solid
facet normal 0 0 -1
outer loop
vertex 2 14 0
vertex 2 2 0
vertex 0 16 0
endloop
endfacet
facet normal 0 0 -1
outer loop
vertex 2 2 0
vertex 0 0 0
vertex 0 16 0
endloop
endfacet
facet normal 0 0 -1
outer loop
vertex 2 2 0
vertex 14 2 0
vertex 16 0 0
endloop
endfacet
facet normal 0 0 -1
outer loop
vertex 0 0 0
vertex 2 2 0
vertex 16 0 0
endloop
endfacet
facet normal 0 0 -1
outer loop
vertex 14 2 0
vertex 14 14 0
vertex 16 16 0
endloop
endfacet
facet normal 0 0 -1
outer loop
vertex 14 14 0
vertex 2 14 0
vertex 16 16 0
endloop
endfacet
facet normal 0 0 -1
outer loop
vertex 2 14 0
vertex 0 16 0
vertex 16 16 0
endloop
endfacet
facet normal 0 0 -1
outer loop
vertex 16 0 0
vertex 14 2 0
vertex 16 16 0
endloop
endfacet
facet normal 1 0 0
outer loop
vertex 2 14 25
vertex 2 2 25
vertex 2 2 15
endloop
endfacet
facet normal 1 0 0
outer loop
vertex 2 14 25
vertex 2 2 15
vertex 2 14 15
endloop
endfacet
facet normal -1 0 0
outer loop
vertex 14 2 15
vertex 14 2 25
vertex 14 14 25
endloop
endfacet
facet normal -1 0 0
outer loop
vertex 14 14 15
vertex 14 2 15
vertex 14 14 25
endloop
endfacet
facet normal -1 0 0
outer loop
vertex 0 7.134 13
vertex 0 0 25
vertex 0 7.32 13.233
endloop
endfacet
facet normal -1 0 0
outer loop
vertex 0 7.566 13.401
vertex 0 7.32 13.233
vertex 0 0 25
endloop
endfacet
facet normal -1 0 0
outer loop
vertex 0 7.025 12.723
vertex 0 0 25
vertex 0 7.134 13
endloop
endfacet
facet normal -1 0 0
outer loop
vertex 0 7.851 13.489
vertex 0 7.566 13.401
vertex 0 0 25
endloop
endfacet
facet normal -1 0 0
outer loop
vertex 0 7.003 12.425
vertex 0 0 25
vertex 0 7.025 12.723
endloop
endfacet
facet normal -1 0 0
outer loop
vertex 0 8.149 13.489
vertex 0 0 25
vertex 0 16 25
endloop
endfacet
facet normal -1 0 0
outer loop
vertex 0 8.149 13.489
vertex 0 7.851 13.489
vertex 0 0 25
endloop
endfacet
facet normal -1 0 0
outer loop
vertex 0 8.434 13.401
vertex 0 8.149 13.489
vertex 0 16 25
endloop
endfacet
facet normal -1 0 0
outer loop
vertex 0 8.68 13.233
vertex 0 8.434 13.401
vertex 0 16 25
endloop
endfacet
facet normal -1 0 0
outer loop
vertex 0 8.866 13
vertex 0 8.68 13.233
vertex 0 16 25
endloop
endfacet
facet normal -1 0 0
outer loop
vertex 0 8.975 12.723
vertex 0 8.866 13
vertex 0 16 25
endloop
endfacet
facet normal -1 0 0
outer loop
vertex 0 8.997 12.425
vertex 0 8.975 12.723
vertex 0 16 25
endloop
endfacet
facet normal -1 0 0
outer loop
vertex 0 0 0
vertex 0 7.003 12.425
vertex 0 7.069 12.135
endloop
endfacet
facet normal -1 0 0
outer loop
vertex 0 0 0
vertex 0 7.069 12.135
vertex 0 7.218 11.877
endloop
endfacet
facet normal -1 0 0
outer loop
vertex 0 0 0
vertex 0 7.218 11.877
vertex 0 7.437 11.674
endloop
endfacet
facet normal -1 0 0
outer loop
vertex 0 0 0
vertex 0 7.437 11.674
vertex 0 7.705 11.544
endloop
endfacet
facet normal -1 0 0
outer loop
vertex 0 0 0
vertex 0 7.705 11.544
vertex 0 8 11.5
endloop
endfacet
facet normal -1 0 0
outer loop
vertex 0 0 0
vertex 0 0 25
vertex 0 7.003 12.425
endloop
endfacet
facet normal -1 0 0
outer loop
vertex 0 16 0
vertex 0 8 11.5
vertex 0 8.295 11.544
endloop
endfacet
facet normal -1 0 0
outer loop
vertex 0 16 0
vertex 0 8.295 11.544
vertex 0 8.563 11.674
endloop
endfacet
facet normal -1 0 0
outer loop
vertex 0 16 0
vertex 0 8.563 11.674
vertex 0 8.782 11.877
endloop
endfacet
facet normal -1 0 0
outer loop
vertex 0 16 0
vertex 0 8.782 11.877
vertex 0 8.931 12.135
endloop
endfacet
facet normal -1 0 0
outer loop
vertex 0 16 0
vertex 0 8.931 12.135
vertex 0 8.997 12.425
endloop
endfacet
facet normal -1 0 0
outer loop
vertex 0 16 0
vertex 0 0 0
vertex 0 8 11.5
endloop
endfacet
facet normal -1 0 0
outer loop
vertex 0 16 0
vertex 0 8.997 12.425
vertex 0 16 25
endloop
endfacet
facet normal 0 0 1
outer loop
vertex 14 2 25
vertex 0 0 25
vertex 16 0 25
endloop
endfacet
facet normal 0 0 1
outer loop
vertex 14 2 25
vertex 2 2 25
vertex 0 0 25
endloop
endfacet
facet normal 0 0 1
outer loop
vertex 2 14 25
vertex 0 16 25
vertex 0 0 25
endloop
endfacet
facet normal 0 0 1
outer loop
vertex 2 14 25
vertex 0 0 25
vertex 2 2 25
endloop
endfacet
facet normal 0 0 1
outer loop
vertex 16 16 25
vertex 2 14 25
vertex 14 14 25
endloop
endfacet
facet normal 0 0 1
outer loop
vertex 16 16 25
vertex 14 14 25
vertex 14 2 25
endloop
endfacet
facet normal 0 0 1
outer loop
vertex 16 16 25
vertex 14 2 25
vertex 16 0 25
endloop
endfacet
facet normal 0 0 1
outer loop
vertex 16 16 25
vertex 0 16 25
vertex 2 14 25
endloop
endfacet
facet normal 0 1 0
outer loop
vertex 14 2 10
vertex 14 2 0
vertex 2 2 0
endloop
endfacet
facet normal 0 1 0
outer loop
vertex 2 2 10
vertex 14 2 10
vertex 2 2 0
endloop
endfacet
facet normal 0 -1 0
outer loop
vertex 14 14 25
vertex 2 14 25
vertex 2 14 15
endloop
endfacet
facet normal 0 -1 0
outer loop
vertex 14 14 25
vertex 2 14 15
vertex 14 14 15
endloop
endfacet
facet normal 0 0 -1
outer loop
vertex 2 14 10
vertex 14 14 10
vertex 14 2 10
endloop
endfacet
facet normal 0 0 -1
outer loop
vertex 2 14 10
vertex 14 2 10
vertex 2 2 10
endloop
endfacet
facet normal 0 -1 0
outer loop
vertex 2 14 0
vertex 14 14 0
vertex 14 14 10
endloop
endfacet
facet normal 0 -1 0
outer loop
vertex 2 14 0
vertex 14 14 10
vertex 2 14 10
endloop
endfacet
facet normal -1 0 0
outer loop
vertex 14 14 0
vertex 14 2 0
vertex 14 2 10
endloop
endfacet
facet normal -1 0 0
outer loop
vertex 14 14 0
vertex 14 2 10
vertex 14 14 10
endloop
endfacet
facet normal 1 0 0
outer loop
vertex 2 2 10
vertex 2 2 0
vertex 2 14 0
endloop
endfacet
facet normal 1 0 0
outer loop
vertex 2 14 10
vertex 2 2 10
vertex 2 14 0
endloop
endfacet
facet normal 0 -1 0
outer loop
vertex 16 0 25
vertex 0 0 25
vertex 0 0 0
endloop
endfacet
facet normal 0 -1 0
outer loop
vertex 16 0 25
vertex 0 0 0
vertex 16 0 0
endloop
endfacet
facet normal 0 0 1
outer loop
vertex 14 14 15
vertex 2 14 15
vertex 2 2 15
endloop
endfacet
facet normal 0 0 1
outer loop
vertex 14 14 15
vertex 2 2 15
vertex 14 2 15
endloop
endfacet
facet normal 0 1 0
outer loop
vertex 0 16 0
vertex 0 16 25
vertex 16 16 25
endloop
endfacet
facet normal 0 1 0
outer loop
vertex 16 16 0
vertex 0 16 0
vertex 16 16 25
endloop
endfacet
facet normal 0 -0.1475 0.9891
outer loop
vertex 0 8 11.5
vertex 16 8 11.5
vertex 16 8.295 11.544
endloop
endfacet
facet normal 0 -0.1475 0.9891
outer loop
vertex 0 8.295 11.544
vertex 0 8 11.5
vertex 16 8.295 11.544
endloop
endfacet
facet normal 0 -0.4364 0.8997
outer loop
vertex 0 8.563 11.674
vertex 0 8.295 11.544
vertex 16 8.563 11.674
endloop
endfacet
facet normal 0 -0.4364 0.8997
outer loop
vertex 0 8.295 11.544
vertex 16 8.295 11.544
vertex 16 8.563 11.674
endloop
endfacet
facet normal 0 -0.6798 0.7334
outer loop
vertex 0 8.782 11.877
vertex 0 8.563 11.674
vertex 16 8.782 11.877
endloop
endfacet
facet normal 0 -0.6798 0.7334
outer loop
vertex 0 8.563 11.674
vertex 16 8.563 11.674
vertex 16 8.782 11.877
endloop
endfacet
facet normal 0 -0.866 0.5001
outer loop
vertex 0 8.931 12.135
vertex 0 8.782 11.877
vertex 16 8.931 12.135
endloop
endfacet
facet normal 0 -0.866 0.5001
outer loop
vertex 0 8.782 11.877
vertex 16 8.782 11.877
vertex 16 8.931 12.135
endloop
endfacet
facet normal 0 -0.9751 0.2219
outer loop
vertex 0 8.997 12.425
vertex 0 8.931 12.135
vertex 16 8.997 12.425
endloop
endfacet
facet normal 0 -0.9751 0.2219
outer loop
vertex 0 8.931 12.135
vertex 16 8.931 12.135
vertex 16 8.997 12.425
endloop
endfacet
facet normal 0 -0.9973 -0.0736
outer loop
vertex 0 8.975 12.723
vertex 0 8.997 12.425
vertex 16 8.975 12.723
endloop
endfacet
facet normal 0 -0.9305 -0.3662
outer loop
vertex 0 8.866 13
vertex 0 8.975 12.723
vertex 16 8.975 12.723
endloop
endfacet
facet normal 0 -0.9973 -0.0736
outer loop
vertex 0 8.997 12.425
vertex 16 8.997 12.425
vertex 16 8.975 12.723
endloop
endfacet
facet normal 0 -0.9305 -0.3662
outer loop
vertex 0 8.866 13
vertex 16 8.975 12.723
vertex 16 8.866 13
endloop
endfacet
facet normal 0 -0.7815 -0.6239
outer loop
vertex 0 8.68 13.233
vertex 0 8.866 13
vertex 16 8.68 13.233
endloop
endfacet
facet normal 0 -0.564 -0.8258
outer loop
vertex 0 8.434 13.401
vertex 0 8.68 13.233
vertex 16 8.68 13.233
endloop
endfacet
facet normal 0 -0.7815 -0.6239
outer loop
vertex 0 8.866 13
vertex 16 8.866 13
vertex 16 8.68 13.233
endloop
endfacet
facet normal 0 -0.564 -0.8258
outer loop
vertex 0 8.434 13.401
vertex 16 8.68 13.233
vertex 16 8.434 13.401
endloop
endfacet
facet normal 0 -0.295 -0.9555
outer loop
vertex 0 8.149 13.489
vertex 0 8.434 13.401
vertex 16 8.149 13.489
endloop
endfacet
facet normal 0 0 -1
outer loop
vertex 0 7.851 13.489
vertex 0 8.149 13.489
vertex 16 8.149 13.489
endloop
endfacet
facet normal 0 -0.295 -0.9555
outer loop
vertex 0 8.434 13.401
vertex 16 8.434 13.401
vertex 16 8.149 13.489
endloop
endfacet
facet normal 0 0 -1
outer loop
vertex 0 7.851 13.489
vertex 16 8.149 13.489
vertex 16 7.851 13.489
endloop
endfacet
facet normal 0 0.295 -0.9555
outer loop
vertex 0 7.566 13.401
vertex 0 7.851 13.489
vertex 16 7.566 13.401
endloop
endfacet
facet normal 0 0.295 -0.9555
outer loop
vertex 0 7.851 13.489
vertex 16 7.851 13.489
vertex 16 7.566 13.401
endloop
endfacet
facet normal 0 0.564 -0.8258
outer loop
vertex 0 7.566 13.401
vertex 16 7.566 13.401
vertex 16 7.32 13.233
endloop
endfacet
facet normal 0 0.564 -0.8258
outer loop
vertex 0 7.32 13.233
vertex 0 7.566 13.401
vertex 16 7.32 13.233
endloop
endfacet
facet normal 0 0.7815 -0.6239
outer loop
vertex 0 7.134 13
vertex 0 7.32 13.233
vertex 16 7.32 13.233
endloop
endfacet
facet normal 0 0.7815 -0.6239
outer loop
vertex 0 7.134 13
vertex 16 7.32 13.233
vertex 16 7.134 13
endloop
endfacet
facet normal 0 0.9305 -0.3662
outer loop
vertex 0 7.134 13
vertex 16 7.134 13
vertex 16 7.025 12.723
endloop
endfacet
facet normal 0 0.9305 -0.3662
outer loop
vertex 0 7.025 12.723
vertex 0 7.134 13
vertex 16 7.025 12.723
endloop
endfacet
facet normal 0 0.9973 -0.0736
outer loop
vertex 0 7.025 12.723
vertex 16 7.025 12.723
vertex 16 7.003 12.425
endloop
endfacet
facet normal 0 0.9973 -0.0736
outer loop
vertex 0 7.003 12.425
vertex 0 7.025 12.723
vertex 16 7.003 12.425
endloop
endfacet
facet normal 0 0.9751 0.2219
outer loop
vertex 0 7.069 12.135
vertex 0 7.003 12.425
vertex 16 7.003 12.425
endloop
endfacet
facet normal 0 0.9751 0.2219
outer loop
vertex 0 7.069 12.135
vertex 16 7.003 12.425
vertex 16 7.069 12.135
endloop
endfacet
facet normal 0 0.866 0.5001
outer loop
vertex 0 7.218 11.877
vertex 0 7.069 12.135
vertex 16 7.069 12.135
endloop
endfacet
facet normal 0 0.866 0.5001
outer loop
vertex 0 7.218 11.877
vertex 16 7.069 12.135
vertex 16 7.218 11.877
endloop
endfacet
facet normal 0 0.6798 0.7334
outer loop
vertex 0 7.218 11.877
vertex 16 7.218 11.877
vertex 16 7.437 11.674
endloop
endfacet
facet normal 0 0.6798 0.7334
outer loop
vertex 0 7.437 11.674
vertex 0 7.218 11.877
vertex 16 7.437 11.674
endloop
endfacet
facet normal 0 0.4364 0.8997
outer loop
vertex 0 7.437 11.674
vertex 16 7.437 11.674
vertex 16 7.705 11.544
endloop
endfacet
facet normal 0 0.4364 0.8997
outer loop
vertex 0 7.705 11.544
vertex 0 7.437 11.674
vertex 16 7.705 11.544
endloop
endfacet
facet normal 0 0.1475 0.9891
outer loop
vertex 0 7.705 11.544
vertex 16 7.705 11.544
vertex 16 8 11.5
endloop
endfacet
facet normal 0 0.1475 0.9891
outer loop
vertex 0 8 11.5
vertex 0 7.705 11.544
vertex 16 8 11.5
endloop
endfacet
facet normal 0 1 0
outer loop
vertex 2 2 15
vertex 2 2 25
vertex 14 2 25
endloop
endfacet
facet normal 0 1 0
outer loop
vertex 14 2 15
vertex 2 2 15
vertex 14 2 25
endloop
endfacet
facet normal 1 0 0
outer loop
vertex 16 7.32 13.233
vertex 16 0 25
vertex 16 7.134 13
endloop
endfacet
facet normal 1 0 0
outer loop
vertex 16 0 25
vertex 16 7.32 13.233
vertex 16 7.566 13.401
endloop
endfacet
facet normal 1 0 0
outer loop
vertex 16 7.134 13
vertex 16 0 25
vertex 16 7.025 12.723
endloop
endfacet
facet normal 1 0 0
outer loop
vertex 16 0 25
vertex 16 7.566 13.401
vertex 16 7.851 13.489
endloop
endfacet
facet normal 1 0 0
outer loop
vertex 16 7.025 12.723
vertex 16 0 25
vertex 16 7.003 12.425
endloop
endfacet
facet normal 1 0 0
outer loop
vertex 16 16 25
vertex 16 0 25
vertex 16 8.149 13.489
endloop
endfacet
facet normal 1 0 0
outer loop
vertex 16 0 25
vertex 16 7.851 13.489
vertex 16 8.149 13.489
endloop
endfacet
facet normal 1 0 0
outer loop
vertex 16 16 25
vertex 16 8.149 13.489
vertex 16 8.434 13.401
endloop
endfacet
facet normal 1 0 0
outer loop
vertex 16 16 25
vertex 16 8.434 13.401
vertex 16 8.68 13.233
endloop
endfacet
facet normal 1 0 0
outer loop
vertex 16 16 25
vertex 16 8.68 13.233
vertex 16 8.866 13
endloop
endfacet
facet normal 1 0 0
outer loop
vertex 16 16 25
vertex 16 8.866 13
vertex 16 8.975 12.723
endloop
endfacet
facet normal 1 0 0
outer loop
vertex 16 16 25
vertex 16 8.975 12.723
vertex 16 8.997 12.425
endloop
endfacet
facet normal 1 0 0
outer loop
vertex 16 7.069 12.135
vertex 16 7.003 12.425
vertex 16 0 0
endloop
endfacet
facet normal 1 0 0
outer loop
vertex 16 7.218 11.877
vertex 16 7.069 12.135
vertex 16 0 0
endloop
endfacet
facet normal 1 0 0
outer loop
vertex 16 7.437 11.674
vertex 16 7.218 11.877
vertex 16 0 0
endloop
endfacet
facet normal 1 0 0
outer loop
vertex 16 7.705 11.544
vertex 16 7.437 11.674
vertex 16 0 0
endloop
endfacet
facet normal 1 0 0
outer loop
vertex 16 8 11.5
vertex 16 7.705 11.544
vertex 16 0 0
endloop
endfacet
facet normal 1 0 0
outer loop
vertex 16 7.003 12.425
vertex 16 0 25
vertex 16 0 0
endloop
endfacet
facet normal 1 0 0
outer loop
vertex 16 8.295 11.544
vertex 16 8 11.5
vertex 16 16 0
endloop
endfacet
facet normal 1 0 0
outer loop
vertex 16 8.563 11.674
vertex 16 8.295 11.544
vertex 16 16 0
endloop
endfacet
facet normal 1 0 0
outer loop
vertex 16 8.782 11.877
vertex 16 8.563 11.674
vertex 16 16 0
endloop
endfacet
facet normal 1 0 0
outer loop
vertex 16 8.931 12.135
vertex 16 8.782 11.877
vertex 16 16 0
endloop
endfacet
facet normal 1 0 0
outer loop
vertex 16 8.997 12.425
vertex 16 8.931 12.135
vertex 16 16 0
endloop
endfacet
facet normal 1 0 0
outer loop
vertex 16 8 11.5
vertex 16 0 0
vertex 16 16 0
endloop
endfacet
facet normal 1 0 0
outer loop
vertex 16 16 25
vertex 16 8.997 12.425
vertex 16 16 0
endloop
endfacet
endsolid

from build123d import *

# Parameters (mm, degrees)
SKETCH_1_W          = 16
SKETCH_1_H          = 16
EXTRUDE_2_DEPTH     = 25
SKETCH_2_W          = 12
SKETCH_2_H          = 12
CUT_EXTRUDE_1_DEPTH = 10
SKETCH_4_W          = 12
SKETCH_4_H          = 12
CUT_EXTRUDE_3_DEPTH = 10
SKETCH_5_R          = 1
CUT_EXTRUDE_4_DEPTH = 18


with BuildPart() as part:
    # 草图1 → 凸台-拉伸2 (new body)
    with BuildSketch(Plane.XY):
        with Locations((8, 8)):
            Rectangle(SKETCH_1_W, SKETCH_1_H)
    extrude(amount=EXTRUDE_2_DEPTH)

    # 草图2 → 切除-拉伸1 (cut)
    with BuildSketch(Plane(origin=(0, 0, 0), x_dir=(-1, 0, 0), z_dir=(0, 0, -1))):
        with Locations((-8, 8)):
            Rectangle(SKETCH_2_W, SKETCH_2_H)
    extrude(amount=-CUT_EXTRUDE_1_DEPTH, mode=Mode.SUBTRACT)

    # 草图4 → 切除-拉伸3 (cut)
    with BuildSketch(Plane.XY.offset(25)):
        with Locations((8, 8)):
            Rectangle(SKETCH_4_W, SKETCH_4_H)
    extrude(amount=-CUT_EXTRUDE_3_DEPTH, mode=Mode.SUBTRACT)

    # 草图5 → 切除-拉伸4 (cut)
    with BuildSketch(Plane(origin=(16, 0, 0), x_dir=(0, 0, -1), z_dir=(1, 0, 0))):
        with Locations((-12.5, 8)):
            Circle(SKETCH_5_R)
    extrude(amount=-CUT_EXTRUDE_4_DEPTH, mode=Mode.SUBTRACT)


solid = part.part
